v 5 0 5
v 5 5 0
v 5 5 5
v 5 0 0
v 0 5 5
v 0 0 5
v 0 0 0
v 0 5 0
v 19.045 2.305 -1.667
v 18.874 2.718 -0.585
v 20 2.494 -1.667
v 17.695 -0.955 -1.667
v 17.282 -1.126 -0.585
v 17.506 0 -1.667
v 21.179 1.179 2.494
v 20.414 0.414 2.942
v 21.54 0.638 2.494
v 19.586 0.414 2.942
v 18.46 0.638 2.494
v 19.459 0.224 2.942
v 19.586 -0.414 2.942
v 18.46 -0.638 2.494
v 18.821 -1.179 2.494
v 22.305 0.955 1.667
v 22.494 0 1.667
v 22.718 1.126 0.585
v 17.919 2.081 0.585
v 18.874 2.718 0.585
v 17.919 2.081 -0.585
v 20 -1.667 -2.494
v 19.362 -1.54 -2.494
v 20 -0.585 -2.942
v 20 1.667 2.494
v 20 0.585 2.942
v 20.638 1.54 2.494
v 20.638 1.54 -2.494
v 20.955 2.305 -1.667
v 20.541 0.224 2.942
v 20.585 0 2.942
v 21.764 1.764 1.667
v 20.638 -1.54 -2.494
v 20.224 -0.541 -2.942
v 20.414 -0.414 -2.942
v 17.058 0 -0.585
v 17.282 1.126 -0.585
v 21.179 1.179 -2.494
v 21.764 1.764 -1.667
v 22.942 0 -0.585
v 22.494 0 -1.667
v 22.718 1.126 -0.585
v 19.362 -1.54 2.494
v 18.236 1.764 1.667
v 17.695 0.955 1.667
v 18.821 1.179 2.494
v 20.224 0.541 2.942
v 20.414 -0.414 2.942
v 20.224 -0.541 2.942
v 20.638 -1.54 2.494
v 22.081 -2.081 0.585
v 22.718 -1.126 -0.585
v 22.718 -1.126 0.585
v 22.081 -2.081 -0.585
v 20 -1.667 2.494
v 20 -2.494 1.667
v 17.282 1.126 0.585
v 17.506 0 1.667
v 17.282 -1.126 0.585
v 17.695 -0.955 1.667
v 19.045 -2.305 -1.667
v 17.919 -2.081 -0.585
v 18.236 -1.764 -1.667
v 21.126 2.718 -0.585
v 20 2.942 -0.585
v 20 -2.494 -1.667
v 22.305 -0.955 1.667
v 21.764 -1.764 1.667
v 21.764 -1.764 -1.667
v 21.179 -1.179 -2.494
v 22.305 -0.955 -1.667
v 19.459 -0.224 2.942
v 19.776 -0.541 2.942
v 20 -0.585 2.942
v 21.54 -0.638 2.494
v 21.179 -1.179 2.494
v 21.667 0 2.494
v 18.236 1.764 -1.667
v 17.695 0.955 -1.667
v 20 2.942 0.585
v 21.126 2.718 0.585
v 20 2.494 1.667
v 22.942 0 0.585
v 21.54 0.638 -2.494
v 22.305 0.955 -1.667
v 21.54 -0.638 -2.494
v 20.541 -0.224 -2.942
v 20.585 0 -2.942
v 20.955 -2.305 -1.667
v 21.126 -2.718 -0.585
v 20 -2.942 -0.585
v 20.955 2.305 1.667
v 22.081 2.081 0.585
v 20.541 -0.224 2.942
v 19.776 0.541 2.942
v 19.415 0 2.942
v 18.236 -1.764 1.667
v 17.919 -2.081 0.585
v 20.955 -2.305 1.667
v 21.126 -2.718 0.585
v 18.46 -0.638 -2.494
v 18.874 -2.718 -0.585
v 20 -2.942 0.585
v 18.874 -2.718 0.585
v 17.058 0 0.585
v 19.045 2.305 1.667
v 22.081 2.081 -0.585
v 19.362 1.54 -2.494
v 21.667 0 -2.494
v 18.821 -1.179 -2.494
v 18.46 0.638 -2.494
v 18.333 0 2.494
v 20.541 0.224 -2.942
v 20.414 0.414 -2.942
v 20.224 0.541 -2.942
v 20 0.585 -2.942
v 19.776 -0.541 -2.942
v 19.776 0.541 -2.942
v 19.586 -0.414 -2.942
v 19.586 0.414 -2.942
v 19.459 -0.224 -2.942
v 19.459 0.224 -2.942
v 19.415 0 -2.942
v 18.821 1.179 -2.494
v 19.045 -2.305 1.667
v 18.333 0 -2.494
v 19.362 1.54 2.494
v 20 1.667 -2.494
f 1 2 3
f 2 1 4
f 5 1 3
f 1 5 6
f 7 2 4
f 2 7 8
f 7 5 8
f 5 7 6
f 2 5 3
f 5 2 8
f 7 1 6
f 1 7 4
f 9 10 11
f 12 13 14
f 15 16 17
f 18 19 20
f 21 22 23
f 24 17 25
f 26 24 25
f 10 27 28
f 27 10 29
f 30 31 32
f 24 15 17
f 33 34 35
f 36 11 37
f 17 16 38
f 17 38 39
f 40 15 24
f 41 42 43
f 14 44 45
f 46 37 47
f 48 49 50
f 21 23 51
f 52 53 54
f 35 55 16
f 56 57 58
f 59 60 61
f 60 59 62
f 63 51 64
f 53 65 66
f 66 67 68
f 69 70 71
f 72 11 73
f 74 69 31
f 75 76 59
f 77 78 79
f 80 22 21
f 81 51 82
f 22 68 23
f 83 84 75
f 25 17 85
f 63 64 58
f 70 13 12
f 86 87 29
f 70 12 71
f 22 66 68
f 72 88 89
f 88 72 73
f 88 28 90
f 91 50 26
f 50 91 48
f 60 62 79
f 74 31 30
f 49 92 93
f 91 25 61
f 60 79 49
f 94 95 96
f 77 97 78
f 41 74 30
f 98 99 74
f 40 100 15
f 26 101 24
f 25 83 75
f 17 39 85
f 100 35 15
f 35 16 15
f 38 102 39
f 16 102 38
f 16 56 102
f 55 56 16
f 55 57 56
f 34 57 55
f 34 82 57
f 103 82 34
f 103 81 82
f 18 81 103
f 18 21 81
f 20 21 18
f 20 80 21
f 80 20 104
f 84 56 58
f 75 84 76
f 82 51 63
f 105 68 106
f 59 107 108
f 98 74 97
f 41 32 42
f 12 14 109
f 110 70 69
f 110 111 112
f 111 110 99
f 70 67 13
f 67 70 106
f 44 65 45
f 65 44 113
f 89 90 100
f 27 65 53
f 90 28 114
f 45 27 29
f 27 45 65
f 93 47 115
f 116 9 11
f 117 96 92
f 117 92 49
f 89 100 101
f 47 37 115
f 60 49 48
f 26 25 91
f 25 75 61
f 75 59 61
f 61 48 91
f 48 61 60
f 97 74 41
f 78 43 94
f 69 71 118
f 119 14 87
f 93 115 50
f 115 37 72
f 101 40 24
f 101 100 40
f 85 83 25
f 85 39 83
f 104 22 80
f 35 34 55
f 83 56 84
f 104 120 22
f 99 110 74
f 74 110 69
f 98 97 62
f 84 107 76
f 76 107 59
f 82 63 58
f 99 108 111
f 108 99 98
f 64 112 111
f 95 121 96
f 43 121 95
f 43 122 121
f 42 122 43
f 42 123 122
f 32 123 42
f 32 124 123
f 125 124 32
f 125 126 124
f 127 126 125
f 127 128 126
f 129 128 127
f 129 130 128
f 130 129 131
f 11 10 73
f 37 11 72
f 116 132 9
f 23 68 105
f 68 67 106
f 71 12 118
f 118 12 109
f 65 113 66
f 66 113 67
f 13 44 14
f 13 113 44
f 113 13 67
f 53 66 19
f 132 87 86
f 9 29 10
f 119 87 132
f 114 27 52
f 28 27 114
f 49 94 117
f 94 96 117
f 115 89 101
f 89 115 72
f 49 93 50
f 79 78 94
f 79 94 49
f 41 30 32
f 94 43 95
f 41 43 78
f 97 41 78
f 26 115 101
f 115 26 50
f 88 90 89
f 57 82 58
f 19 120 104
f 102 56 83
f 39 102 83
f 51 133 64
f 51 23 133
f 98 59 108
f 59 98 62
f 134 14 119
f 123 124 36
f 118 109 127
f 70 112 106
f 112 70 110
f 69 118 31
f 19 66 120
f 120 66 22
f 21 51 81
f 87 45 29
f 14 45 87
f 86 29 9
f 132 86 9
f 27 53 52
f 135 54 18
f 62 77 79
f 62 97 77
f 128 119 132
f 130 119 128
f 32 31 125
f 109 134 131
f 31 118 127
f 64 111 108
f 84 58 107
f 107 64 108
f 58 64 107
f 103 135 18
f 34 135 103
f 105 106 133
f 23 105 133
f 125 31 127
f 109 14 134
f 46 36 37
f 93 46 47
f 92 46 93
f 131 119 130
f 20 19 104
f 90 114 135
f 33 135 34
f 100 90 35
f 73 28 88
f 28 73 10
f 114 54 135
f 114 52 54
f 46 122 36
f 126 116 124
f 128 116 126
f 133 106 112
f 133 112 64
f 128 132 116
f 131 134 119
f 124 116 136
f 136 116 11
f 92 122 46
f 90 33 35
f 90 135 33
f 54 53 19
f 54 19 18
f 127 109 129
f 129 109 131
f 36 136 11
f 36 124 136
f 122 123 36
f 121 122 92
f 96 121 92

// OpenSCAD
// A second `!` NESTED INSIDE the first — which is a different case from a
// second `!` that is a SIBLING of the first, and conflating them deleted half
// the model.
//
// WHY IT WAS CHOSEN. `edge_modifier_root` is one `!` on one statement and stayed
// `SAME` through the whole defect. `src/core/node.cc`'s `find_root_tag` walks
// the INSTANTIATED tree and never consults an ancestor's tag, so the outer `!`
// is found first and the inner one is simply an ordinary child of the subtree
// that won. OpenSCAD warns ("More than one Root Modifier (!)") and renders the
// outer subtree WHOLE — measured at 2026.08.07: 231.0381 mm³, 264 facets, both
// children present.
//
// WHAT IT WOULD CATCH. Our evaluator's "am I already inside a chosen root?" and
// "has a root been chosen?" used to be the same flag. While the outer body was
// still running the root was not yet recorded, so the inner `!` was taken for
// the FIRST root: it stole its own subtree out of the outer body's sink, and
// the now-empty outer sink then overwrote it. We drew the sphere alone at
// 106.0381 mm³ and 🔴 THE CUBE VANISHED, with no diagnostic of any kind.
//
// 🔴 THE THIRD SOLID IS A CONTROL AND MUST NOT BE DELETED, AND IT IS THE ONE
// THING THIS CASE HAS THAT THE OTHER THREE ALREADY HAD. Everything under test
// here sits INSIDE the `!`, so a regression that refuses `!` by name and drops
// its statement would leave the file emitting nothing at all — `REFUSED`, which
// `CAD1` treats as safe, because nothing was emitted and nothing can be a wrong
// part. A capability silently LOST is exactly what a corpus exists to notice.
// The sibling at y=40 is suppressed by a WORKING root modifier and emitted by a
// broken one, so the loss is compared and scores `DIVERGES` instead of
// disappearing into a green. (Confirmed at the binary: adding it does not change
// what OpenSCAD exports — still 264 facets, still the union alone.)
//
// Decidability: the cube is 0…5 in x, the sphere is 17…23, and the control
// solid — in the run where a defect lets it out — is 40 mm away in y. No two
// bounding boxes can touch, so the mesh leg can always decide.
//
// PLANTED AND WATCHED RED (throwaway copy of `web/src/cad/scad.ts`, md5-verified
// against the live file before the edit; openscad 2026.08.07):
//   · the nested/sibling distinction removed (pre-`d749b176c2` behaviour) -> DIVERGES
//   · `!` refused by name and its statement dropped                       -> DIVERGES
//
// 🔴 THE CONTROL SOLID WAS PROVED, NOT ASSUMED. The second plant was run twice:
// against this file as shipped -> `DIVERGES` (NO-GO), and against a byte-copy of
// it with the last line deleted -> `REFUSED` (GO). Same defect, same plant, same
// binary; the only difference is the control solid, and it is the difference
// between a gate that goes red and a gate that does not.
!union() {
  !cube(5);
  translate([20, 0, 0]) sphere(3, $fn = 16);
}
translate([0, 40, 0]) cube([6, 5, 5]);
